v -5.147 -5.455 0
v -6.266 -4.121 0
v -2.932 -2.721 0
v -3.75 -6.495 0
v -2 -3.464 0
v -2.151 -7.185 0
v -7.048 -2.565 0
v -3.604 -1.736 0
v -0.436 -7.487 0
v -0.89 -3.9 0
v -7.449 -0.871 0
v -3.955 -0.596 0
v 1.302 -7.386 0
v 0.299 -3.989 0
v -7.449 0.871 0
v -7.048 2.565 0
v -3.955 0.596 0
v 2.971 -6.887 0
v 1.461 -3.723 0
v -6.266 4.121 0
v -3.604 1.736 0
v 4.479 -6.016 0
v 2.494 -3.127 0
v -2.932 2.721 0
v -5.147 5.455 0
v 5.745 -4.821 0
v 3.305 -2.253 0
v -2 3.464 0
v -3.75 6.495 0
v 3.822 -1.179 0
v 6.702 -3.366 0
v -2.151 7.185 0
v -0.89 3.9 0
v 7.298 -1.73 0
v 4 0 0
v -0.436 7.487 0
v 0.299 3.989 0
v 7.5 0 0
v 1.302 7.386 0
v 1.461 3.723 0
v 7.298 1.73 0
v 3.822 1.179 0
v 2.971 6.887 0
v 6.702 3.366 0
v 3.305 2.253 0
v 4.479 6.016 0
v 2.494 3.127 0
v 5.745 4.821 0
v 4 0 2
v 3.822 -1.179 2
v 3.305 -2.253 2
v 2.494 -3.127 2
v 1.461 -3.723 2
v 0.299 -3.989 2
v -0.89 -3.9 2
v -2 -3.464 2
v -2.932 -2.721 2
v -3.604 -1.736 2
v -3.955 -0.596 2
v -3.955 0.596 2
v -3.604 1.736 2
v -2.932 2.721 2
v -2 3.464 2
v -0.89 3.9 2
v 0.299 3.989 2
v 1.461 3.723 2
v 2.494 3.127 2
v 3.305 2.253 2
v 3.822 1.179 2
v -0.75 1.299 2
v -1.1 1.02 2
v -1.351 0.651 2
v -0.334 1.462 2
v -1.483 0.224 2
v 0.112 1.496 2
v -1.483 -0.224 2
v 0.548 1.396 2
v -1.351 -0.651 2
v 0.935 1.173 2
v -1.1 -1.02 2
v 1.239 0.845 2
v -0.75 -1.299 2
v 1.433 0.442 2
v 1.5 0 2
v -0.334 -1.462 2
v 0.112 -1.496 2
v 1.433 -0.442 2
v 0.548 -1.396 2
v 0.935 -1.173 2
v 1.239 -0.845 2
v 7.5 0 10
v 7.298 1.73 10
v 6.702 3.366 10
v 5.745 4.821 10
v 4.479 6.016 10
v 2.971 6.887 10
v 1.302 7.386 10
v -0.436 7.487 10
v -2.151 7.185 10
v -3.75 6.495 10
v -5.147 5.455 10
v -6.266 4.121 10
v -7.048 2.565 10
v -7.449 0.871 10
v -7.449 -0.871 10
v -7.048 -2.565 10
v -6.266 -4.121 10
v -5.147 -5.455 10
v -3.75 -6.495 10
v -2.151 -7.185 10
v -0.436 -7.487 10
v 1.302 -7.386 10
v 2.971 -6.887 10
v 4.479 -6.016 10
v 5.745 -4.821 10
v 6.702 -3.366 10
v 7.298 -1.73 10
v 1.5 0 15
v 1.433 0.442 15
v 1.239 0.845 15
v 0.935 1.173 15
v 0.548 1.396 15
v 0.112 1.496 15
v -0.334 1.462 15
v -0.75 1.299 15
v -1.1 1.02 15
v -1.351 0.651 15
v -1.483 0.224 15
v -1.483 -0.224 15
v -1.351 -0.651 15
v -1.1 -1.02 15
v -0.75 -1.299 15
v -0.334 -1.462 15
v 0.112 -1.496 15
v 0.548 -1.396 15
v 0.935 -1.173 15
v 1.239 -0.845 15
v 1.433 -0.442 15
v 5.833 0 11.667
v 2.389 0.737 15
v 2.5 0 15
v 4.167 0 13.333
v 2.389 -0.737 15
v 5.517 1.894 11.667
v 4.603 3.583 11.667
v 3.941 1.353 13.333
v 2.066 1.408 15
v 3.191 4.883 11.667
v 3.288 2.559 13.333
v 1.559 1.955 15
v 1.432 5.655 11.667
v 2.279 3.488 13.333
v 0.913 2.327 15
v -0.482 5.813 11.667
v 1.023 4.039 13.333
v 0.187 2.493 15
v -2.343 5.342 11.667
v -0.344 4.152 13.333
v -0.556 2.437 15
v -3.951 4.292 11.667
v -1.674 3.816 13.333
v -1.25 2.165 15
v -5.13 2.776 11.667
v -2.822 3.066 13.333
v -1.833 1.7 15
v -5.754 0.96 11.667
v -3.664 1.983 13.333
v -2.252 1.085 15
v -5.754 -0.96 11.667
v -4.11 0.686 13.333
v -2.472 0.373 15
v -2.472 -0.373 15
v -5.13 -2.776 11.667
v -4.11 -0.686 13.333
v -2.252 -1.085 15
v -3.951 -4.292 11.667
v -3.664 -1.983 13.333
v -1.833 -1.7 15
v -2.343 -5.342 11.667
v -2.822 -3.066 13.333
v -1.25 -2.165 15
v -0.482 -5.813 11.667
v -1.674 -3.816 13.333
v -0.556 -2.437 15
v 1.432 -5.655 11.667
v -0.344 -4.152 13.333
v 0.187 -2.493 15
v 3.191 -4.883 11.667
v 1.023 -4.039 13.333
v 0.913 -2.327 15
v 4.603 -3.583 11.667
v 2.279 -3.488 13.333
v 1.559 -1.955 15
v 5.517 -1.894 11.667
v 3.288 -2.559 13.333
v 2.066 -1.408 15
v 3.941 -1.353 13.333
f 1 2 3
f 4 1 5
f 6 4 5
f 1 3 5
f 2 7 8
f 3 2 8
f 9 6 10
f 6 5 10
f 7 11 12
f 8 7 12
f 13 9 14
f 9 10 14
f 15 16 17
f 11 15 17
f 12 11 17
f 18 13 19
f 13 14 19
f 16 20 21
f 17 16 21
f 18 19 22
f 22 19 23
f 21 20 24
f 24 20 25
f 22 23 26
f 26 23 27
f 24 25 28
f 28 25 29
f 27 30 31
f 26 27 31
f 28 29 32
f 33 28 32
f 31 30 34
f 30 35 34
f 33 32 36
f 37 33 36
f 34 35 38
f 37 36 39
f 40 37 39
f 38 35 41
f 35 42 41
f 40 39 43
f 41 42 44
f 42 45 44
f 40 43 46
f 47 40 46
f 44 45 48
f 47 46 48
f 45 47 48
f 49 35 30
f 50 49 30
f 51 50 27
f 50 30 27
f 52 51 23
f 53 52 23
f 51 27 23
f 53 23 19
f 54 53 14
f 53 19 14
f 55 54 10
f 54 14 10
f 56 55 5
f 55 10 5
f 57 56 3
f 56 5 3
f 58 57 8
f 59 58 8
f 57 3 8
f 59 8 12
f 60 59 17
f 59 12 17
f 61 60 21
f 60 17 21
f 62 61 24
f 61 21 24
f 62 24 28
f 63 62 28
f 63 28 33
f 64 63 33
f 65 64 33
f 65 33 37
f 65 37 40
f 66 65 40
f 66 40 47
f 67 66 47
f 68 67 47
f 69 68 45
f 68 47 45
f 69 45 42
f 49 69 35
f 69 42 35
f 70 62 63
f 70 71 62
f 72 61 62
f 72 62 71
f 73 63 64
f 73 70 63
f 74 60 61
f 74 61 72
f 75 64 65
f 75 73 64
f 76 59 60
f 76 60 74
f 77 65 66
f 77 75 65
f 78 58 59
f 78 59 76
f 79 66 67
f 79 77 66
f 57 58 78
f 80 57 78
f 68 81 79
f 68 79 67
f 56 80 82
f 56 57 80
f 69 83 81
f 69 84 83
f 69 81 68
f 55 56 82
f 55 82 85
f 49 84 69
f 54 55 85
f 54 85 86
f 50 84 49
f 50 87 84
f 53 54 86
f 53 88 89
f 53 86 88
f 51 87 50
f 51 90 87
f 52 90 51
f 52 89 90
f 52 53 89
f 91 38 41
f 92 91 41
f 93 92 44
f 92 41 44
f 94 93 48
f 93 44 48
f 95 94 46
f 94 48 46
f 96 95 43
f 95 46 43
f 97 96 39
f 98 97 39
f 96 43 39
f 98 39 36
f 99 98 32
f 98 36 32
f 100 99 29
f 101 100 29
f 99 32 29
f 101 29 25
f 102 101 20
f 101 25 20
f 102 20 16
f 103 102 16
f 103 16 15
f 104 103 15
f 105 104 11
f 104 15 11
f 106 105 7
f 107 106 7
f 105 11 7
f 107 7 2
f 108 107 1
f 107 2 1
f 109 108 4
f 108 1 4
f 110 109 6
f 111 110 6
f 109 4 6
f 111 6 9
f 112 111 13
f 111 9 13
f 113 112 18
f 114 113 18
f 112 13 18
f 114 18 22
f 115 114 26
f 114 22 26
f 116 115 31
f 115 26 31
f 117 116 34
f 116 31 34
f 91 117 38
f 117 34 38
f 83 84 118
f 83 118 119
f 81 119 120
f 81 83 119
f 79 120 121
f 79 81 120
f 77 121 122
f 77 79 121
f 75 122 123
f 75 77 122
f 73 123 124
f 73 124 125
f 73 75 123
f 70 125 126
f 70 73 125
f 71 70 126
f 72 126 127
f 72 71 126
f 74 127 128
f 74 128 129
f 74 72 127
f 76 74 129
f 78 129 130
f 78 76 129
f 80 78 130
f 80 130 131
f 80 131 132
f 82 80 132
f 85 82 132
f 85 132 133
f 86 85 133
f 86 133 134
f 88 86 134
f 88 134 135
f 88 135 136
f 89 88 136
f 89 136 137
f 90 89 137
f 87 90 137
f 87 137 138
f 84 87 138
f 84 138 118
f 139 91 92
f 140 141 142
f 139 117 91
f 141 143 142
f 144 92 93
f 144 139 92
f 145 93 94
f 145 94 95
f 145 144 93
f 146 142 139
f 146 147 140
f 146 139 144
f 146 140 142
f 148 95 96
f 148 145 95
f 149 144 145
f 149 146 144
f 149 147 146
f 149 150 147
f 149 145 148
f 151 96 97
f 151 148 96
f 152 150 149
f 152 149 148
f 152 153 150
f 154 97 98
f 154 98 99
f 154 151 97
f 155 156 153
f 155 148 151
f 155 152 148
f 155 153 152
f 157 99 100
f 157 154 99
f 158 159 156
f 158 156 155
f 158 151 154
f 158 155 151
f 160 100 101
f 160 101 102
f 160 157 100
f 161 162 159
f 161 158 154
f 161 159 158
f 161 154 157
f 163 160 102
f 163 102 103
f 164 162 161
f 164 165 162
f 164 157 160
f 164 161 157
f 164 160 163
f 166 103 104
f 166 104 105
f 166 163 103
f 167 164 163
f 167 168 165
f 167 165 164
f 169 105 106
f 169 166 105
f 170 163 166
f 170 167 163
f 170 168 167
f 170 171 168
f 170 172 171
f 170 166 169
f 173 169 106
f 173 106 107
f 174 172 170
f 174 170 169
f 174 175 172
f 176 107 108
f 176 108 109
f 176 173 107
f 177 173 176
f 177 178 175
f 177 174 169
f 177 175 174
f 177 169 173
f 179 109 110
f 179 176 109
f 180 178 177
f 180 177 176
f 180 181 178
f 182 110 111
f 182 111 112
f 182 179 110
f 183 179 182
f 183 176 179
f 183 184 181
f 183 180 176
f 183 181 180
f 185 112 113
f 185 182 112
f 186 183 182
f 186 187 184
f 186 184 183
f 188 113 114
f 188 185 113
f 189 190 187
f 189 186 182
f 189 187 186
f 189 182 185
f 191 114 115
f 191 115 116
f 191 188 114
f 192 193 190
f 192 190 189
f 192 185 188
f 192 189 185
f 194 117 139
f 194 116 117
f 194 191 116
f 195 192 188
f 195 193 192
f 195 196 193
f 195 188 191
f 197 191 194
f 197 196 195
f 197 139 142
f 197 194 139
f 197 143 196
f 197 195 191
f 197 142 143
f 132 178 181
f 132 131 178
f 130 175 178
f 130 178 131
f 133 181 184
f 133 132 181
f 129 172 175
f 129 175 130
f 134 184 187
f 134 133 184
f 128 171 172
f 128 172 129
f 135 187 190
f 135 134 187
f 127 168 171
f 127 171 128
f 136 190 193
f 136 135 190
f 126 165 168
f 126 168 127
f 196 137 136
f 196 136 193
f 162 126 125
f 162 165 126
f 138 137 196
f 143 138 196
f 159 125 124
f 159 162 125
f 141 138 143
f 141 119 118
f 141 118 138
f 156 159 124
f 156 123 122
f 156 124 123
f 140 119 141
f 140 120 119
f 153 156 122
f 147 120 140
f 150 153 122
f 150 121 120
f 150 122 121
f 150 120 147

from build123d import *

# Parameters (mm, degrees)
F0_R     = 7.5
F0_R_2   = 1.5
F1_DEPTH = 15
F2_SIZE  = 5
F3_R     = 4
F4_DEPTH = 2


with BuildPart() as f1:
    # F0 (on Top) → F1 (new body)
    with BuildSketch(Plane.XY):
        Circle(F0_R)
        Circle(F0_R_2, mode=Mode.SUBTRACT)
    extrude(amount=F1_DEPTH)

    # F2
    f2_edges = [f1.edges().sort_by_distance(p)[0] for p in [
        (-7.5, 0, 15),
    ]]
    chamfer(f2_edges, length=F2_SIZE)

    # F3 (on face) → F4 (cut)
    with BuildSketch(Plane(origin=(0, 0, 0), x_dir=(1, 0, 0), z_dir=(0, 0, -1))):
        Circle(F3_R)
    extrude(amount=-F4_DEPTH, mode=Mode.SUBTRACT)


solid = f1.part
